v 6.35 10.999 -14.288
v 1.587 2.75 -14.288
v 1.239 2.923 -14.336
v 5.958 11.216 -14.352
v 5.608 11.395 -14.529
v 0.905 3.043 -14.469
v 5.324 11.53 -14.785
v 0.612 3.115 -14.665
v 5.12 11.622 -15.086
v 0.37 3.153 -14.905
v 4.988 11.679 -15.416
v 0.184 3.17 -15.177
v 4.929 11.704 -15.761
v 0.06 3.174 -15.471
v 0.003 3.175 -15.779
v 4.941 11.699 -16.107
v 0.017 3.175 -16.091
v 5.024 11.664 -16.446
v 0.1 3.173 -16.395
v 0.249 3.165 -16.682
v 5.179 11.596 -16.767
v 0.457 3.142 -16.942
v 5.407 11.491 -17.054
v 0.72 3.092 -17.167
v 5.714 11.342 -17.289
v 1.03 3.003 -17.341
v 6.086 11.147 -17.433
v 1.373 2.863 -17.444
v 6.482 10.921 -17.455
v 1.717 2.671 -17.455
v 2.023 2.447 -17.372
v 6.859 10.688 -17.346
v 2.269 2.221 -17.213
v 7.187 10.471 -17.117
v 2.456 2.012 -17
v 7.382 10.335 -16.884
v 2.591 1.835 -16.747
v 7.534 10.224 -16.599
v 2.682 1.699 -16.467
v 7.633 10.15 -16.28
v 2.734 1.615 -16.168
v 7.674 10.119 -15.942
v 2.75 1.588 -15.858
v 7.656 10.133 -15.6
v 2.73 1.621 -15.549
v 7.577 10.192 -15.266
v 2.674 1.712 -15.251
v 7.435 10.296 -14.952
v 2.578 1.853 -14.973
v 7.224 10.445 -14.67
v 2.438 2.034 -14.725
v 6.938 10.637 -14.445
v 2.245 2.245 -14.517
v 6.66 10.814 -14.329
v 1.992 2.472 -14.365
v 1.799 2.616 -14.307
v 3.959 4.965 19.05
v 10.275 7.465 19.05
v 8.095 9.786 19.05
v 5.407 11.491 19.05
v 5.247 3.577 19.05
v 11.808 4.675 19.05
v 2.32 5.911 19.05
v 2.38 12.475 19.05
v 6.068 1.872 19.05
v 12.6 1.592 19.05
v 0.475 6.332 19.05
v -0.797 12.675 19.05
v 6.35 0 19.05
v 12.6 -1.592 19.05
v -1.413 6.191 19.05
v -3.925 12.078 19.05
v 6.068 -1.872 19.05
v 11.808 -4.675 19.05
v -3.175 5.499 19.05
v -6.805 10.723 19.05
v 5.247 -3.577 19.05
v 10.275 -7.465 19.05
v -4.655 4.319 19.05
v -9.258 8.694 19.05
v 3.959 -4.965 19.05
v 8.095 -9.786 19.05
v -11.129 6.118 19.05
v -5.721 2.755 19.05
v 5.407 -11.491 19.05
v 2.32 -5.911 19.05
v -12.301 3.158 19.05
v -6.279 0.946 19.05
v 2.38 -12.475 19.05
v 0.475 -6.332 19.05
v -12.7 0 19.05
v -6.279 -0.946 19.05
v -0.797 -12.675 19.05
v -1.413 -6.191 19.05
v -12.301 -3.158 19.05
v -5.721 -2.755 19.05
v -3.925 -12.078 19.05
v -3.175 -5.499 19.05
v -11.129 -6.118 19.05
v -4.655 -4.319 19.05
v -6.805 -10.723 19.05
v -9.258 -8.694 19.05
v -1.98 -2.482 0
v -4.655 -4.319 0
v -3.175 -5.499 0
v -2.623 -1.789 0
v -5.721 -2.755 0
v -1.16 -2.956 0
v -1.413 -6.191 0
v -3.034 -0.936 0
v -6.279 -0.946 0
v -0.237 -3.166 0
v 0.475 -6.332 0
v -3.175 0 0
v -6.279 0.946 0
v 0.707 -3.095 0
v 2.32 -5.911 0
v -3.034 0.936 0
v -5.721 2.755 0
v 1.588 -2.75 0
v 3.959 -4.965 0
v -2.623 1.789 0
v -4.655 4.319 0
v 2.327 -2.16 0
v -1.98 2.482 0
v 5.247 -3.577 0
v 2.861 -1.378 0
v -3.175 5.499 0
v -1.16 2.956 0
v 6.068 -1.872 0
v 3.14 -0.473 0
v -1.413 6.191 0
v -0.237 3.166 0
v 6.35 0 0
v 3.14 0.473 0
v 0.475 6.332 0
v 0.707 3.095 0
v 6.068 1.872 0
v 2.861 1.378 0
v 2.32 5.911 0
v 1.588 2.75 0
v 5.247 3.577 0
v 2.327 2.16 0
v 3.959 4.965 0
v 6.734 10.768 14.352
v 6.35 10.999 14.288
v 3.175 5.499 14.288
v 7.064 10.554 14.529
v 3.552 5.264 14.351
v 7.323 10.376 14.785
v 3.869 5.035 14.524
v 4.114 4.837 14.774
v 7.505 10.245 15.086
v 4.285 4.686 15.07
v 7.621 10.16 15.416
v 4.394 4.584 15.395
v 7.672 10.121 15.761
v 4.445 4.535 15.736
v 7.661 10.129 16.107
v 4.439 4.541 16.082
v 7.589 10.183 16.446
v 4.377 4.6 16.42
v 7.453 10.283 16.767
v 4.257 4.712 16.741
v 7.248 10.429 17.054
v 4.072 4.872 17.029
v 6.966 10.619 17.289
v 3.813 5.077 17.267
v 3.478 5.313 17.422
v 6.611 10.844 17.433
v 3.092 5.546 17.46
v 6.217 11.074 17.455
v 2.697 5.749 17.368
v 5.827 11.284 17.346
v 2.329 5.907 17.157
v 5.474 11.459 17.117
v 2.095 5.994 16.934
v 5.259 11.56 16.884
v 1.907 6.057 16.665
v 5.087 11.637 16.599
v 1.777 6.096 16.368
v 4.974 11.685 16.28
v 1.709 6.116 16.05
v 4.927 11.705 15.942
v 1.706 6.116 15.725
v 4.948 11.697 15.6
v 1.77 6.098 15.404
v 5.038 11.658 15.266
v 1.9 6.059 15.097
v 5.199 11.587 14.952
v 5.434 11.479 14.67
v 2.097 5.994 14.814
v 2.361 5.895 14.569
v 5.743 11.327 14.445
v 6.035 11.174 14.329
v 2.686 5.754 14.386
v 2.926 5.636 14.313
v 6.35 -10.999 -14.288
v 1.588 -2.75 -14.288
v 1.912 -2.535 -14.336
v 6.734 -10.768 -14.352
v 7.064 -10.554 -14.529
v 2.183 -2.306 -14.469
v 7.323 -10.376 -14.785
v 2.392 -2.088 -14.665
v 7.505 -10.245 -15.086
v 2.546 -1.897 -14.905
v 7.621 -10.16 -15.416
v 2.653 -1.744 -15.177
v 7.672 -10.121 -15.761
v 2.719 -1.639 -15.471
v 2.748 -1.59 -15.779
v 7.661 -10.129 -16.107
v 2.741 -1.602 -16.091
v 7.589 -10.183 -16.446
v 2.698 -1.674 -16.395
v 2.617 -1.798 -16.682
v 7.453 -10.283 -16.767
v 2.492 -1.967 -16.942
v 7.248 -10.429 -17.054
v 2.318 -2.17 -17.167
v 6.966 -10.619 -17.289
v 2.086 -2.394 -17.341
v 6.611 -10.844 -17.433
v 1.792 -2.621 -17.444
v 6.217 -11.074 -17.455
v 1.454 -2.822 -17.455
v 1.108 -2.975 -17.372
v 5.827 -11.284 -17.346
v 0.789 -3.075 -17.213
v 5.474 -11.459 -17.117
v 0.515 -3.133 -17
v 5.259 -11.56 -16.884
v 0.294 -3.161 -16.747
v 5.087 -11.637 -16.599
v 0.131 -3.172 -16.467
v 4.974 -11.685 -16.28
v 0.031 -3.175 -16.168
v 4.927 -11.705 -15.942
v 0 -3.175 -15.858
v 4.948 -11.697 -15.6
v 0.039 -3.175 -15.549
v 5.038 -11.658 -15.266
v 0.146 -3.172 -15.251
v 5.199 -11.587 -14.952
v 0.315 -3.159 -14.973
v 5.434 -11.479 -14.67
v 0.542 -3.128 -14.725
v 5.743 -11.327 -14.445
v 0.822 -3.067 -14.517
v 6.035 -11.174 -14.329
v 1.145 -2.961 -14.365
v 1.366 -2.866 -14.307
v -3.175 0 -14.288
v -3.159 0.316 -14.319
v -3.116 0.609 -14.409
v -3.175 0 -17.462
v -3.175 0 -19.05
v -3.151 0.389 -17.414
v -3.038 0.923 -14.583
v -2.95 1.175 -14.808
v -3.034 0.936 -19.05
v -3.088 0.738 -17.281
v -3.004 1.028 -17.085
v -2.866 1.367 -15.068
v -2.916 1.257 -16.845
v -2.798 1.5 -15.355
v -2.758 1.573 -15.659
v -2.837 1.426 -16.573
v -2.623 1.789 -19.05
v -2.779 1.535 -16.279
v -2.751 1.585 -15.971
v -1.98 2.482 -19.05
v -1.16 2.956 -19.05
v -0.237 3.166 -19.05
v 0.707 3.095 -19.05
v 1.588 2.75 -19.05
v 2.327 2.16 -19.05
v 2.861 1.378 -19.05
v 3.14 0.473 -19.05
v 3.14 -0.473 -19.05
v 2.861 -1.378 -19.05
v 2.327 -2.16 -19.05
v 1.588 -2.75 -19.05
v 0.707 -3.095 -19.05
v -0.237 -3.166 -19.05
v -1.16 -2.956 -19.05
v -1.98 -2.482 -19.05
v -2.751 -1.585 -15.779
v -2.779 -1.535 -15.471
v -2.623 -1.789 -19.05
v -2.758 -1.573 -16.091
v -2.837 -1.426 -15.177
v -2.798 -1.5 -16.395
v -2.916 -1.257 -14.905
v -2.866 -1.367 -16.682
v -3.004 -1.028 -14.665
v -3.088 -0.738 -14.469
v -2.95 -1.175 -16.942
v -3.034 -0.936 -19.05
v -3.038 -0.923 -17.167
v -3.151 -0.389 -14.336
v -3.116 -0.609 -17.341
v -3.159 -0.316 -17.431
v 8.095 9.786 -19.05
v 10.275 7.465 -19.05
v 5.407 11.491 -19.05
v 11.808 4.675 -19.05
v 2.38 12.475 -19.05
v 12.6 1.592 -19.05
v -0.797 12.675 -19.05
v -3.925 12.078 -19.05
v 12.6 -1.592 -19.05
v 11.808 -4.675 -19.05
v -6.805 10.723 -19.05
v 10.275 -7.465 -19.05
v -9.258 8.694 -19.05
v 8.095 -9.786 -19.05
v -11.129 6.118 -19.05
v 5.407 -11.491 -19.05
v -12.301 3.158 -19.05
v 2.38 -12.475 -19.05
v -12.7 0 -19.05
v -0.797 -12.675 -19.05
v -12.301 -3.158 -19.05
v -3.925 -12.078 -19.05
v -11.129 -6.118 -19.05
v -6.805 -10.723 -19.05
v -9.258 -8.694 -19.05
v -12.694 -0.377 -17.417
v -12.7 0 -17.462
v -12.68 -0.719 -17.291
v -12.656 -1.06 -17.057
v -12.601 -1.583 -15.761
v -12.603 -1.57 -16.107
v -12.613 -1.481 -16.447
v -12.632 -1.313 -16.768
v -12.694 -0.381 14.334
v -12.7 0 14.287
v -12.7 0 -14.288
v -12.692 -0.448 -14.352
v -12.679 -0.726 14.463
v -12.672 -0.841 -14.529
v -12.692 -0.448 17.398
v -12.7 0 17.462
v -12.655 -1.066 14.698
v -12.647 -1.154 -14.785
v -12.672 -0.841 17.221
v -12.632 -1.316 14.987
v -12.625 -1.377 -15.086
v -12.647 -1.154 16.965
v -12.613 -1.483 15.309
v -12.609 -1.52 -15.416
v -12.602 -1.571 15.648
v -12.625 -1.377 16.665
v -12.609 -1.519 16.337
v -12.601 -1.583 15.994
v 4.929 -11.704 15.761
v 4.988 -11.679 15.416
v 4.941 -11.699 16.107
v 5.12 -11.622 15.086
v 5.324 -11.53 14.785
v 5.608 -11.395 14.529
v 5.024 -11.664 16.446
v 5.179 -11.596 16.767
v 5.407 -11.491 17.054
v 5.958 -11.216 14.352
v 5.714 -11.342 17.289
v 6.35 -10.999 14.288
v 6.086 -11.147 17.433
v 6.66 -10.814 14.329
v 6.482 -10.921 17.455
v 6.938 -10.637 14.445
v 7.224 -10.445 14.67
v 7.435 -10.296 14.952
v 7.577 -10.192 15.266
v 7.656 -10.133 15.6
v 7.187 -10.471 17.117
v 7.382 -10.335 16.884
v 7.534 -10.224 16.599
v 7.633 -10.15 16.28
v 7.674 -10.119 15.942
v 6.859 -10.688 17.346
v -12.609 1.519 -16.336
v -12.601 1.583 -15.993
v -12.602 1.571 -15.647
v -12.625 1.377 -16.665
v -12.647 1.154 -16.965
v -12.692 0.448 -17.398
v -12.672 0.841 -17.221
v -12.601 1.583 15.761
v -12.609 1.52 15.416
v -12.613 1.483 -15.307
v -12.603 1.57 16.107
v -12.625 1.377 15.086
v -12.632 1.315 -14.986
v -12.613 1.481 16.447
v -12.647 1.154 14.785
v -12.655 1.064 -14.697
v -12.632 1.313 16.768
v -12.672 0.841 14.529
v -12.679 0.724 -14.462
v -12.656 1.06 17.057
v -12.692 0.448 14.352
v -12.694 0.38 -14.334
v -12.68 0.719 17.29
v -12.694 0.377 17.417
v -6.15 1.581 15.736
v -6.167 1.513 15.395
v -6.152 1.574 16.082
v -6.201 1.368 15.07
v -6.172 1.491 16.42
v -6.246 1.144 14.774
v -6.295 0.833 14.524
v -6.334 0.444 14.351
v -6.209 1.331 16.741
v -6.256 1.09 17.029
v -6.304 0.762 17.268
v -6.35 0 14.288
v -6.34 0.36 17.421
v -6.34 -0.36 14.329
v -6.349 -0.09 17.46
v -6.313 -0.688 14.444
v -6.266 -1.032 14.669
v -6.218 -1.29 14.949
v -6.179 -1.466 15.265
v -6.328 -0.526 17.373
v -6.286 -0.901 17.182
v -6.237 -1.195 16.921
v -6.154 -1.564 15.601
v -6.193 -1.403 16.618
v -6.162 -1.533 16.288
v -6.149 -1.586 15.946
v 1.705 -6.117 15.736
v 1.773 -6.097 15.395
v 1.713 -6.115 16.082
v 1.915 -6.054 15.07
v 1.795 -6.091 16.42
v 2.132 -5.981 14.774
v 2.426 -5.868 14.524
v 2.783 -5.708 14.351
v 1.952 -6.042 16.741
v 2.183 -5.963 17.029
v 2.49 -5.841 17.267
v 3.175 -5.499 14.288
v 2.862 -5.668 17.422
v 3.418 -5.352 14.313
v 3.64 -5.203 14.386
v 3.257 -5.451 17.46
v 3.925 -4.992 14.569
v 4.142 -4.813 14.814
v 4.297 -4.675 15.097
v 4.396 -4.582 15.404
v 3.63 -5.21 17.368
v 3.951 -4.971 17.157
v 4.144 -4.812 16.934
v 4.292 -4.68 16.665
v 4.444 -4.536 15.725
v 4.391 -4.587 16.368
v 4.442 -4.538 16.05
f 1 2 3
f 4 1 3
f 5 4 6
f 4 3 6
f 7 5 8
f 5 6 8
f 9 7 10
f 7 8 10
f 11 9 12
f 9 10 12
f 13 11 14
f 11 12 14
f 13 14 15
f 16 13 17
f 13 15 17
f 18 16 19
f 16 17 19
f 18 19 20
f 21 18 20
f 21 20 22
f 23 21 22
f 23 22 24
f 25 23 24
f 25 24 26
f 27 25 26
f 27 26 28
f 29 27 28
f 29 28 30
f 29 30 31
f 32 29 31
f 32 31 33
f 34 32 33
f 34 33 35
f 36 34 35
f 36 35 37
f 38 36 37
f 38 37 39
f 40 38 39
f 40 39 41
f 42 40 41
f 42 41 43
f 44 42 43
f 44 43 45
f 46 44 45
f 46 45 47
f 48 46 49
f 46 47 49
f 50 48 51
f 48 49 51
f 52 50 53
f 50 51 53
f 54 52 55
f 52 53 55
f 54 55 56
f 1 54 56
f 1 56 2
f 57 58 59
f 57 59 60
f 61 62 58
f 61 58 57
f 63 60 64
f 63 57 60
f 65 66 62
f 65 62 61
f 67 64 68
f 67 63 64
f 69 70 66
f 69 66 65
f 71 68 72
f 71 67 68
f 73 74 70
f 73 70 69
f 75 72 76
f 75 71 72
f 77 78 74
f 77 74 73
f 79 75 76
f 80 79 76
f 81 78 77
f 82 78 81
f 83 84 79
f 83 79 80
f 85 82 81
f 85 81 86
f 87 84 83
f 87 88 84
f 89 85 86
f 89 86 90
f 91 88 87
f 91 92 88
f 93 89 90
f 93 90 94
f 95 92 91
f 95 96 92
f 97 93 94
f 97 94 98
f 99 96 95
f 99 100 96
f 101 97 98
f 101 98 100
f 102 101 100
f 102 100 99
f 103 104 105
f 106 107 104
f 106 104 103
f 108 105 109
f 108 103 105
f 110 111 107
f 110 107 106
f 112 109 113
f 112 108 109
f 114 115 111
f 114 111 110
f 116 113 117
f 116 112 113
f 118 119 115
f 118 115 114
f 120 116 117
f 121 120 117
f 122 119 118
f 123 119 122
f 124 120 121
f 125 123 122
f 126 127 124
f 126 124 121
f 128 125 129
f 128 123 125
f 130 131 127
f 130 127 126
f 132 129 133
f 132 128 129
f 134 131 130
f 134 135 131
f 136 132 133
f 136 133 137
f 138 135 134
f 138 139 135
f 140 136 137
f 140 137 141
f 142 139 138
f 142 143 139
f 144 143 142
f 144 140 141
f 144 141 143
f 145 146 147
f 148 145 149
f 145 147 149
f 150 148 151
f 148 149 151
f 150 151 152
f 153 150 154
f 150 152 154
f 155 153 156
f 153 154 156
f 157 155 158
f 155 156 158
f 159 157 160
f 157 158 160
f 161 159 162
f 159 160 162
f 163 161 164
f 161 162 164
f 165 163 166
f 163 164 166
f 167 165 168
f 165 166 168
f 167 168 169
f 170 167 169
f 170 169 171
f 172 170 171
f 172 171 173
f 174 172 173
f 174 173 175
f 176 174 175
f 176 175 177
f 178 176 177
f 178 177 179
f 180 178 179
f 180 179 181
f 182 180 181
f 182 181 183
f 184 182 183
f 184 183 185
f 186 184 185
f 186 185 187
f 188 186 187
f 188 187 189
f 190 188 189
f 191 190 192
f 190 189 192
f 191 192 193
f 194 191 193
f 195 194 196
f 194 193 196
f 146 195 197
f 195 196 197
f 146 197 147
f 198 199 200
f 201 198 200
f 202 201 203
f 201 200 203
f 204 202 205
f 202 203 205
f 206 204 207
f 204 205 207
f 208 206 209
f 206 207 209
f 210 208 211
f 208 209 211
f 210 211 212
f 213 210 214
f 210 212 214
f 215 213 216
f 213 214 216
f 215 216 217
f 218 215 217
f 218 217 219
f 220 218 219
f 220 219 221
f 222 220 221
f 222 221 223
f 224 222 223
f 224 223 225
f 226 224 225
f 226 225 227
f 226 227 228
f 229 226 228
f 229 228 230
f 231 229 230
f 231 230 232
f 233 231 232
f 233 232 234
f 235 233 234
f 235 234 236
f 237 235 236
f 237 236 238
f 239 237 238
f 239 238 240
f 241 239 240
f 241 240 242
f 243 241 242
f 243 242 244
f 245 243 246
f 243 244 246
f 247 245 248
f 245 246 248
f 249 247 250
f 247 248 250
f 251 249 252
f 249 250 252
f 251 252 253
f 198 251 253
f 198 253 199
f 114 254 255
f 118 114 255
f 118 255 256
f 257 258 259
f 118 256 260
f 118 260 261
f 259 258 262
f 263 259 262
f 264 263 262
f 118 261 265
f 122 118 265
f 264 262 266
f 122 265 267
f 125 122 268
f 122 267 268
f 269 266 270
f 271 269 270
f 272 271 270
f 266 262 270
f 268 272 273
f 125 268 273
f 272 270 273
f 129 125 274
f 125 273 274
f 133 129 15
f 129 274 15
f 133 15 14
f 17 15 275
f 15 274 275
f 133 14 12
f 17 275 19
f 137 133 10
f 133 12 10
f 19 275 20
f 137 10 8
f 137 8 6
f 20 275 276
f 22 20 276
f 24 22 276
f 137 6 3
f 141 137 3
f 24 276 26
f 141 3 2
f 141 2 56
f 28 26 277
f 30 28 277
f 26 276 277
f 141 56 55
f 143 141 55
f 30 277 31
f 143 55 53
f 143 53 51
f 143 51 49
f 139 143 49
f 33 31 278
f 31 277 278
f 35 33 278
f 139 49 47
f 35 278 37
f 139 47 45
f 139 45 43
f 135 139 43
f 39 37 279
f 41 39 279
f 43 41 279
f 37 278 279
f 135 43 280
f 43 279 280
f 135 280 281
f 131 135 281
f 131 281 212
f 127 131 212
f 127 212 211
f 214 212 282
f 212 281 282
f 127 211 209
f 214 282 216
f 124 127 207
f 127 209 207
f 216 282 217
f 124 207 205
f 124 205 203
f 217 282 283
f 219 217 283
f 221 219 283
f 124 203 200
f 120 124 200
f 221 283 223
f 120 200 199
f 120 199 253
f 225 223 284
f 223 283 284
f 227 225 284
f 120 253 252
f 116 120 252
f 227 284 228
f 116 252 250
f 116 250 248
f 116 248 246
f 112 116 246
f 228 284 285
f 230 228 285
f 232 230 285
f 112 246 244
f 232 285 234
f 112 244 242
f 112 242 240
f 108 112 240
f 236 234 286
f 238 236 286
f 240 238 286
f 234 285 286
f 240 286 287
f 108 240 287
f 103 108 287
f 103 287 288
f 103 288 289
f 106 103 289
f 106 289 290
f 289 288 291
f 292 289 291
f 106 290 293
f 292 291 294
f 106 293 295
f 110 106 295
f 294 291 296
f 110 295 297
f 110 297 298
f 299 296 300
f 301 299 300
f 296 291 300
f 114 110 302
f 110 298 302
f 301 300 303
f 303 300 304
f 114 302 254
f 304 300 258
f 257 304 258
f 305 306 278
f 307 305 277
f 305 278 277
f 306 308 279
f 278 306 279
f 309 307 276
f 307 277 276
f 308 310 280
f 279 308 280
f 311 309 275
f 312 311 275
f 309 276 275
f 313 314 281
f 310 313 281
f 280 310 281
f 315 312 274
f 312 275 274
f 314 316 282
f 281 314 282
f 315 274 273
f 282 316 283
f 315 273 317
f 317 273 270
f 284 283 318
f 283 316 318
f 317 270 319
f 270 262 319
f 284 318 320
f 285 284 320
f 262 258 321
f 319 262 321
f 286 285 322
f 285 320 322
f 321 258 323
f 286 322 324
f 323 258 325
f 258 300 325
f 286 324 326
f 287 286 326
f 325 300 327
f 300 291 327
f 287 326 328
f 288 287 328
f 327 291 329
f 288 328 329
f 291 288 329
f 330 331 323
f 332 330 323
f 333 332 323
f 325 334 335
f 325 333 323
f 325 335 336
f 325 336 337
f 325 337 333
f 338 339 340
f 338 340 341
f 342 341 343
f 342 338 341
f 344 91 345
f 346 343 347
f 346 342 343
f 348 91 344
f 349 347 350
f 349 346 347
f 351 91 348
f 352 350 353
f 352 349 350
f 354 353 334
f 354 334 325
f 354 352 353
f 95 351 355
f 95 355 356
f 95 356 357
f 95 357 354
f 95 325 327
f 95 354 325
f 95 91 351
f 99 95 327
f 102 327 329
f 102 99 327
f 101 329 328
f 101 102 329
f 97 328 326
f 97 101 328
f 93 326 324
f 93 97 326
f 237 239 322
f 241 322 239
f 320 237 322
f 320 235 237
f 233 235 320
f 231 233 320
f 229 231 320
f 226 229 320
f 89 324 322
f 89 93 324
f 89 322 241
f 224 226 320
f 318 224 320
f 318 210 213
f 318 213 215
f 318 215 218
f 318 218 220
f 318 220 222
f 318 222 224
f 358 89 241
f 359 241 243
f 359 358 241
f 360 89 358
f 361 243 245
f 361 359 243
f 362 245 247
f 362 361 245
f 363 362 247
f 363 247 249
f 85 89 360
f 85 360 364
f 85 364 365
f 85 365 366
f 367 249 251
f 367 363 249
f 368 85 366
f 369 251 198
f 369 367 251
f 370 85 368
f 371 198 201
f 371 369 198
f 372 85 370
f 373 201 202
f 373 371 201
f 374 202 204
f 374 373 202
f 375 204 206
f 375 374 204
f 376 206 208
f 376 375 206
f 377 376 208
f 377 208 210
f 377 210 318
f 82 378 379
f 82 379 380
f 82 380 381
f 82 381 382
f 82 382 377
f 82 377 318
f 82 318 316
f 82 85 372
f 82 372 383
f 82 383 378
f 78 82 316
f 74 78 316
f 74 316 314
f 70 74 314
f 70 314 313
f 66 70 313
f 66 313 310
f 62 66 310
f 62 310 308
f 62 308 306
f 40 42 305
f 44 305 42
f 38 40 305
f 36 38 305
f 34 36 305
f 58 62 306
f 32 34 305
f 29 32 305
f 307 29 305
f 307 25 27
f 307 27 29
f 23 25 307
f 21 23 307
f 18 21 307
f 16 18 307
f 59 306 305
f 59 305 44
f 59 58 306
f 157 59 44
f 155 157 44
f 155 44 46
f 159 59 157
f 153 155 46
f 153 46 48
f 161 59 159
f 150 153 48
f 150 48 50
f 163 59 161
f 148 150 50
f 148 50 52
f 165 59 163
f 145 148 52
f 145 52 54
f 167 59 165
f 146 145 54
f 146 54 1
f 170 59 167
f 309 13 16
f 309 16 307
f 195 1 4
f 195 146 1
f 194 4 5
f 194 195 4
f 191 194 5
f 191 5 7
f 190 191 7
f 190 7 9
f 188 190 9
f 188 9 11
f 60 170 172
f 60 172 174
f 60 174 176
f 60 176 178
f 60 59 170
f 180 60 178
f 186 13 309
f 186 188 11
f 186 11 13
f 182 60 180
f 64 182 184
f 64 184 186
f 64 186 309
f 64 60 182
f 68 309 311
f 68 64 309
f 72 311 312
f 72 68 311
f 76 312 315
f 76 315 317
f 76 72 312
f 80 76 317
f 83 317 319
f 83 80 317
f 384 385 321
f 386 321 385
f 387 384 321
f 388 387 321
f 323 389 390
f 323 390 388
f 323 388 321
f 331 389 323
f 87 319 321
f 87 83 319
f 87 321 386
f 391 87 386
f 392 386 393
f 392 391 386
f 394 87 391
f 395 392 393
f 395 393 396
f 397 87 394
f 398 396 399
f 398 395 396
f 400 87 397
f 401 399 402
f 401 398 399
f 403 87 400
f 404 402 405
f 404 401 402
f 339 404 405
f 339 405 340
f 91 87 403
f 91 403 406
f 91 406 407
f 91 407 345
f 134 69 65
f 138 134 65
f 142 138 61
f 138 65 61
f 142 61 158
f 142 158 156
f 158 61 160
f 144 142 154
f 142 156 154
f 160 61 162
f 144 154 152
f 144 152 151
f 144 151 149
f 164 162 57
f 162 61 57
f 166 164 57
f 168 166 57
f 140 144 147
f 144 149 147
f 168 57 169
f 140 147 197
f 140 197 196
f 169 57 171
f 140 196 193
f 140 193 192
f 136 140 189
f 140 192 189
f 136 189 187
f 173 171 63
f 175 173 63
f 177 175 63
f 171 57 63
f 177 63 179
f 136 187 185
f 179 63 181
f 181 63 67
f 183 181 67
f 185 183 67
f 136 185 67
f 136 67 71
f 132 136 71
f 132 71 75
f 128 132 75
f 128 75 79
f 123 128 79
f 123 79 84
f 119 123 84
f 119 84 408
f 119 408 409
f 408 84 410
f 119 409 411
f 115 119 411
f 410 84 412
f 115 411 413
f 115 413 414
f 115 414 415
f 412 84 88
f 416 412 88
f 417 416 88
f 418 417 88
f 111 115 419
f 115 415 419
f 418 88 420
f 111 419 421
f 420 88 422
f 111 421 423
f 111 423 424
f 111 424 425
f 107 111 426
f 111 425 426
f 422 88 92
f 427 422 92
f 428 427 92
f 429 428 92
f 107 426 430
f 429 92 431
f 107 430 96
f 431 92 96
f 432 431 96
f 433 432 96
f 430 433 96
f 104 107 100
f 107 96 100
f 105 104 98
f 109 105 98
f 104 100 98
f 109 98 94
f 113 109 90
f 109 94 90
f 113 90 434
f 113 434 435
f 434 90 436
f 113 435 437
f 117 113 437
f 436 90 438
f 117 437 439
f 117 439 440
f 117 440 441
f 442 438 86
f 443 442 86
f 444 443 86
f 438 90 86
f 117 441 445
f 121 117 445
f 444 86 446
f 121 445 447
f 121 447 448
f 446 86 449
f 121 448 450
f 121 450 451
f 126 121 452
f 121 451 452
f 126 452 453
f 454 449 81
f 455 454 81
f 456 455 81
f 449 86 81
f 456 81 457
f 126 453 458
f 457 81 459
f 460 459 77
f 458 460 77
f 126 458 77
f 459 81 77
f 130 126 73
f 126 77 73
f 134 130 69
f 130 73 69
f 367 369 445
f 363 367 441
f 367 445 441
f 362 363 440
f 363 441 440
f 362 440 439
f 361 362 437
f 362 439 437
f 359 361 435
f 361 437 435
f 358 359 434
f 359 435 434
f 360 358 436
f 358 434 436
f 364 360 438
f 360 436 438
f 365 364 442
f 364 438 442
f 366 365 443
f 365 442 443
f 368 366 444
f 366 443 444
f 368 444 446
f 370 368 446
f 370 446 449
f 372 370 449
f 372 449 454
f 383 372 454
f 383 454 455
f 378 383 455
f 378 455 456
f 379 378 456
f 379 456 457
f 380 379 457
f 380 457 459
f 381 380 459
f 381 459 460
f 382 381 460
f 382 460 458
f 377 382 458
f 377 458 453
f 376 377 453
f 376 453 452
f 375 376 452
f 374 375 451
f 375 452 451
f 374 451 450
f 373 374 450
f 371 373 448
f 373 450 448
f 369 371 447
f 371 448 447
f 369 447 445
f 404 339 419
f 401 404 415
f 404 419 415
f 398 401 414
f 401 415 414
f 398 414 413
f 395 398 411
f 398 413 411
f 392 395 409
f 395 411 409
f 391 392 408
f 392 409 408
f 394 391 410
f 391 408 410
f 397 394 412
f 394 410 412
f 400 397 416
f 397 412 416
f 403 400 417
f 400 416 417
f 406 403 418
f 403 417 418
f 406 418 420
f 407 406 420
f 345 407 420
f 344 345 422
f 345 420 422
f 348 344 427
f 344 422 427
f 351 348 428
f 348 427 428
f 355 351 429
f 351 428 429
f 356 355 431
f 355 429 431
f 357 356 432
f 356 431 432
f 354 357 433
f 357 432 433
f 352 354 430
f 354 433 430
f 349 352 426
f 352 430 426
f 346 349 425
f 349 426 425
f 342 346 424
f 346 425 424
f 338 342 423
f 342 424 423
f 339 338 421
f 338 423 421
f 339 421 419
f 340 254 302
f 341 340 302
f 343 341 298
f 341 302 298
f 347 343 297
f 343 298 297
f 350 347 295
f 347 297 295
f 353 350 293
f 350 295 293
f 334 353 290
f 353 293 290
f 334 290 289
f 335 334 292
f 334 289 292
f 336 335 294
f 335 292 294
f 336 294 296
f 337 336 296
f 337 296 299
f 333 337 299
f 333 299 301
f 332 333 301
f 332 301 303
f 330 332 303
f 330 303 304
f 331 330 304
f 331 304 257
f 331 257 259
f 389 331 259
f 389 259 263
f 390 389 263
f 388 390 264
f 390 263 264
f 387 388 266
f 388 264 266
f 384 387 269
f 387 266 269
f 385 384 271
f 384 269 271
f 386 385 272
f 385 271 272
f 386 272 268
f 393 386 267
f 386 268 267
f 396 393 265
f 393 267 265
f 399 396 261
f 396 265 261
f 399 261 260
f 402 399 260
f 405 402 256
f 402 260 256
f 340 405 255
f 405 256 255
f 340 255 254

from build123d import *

# Parameters (mm, degrees)
SKETCH1_R           = 12.7
BOSS_EXTRUDE1_DEPTH = 19.05
SKETCH2_R           = 6.35
CUT_EXTRUDE1_DEPTH  = 19.05
SKETCH3_R           = 3.175
CUT_EXTRUDE2_DEPTH  = 19.05
SKETCH4_R           = 1.5875
CUT_EXTRUDE3_DEPTH  = 19.05
CIRPATTERN1_COUNT   = 3


with BuildPart() as part:
    # Sketch1 → Boss-Extrude1 (new, symmetric)
    with BuildSketch(Plane.XY):
        with Locations(Location((0, 0, 0), (0, 0, 180))):
            Circle(SKETCH1_R)
    extrude(amount=BOSS_EXTRUDE1_DEPTH, both=True)

    # Sketch2 → Cut-Extrude1 (cut)
    with BuildSketch(Plane.XY.offset(19.05)):
        Circle(SKETCH2_R)
    extrude(amount=-CUT_EXTRUDE1_DEPTH, mode=Mode.SUBTRACT)

    # Sketch3 → Cut-Extrude2 (cut)
    with BuildSketch(Plane(origin=(0, 0, -19.05), x_dir=(-1, 0, 0), z_dir=(0, 0, -1))):
        Circle(SKETCH3_R)
    extrude(amount=-CUT_EXTRUDE2_DEPTH, mode=Mode.SUBTRACT)

    # Sketch4 → Cut-Extrude3 (cut)
    with BuildSketch(Plane(origin=(0, 0, 0), x_dir=(0, 0, -1), z_dir=(1, 0, 0))):
        with Locations(Location((15.875, 0, 0), (0, 0, 180))):
            Circle(SKETCH4_R)
        with Locations((-15.875, 0)):
            Circle(SKETCH4_R)
    cut_extrude3 = extrude(amount=-CUT_EXTRUDE3_DEPTH, mode=Mode.SUBTRACT)

    # CirPattern1: Cut-Extrude3 ×3 about axis
    cirpattern1_axis = Axis((0, 0, 19.05), (0, 0, -1))
    for i in range(1, CIRPATTERN1_COUNT):
        add(cut_extrude3.rotate(cirpattern1_axis, i * 360 / CIRPATTERN1_COUNT), mode=Mode.SUBTRACT)


solid = part.part
